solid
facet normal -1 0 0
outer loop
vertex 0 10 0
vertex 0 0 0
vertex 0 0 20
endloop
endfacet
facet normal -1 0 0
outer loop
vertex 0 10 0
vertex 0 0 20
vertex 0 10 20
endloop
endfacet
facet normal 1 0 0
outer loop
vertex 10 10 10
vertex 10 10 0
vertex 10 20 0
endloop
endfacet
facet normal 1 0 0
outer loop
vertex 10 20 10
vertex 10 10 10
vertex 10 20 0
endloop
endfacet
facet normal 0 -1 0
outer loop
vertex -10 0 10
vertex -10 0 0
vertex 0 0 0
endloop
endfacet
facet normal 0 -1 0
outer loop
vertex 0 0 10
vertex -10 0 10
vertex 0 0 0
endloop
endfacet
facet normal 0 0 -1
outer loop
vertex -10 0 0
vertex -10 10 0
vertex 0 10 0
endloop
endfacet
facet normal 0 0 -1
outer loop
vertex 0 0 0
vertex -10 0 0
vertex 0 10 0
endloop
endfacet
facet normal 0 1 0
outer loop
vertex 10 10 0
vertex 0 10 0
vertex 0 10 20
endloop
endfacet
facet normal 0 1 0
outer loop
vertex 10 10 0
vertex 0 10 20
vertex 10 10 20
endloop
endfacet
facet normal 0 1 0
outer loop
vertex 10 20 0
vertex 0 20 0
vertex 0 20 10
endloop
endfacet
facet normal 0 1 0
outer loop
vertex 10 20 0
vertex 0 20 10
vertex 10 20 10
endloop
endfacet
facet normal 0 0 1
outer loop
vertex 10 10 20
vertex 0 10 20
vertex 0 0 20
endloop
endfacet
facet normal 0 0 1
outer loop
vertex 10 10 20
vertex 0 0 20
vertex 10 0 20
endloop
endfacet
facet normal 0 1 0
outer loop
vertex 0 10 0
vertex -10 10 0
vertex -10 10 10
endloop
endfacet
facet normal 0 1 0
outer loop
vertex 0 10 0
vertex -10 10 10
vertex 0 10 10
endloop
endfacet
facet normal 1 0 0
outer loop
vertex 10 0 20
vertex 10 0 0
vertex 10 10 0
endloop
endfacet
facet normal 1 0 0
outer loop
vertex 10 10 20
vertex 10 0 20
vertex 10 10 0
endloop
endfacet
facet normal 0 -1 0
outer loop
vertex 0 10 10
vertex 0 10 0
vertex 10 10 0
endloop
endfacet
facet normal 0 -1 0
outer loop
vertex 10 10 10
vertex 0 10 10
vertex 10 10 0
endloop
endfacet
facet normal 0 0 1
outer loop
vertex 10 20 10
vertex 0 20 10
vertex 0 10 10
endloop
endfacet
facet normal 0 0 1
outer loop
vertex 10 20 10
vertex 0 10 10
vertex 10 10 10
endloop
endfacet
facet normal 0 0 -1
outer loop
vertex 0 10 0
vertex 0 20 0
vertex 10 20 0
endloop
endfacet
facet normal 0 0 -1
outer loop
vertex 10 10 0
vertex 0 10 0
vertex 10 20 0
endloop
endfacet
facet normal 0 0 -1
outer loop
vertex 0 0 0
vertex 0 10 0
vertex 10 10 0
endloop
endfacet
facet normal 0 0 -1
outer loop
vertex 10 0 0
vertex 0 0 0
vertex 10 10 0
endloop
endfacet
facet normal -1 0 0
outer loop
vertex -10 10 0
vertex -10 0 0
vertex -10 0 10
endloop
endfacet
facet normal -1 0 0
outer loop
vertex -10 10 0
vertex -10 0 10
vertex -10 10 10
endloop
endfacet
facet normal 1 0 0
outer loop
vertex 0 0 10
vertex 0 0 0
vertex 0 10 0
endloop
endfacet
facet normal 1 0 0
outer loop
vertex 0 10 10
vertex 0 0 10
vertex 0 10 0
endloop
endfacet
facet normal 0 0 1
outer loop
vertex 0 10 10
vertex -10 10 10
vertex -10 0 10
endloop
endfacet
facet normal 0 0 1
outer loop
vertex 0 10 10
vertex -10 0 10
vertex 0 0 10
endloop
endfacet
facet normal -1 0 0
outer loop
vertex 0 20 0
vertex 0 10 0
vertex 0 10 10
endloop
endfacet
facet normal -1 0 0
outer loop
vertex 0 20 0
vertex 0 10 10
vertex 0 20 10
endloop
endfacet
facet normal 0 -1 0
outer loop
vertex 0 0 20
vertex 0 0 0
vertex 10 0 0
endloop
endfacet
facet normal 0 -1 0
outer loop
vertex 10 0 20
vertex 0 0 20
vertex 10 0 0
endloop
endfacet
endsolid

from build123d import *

# Parameters (mm, degrees)
BOX_W        = 10
BOX_H        = 10
BOX_DEPTH    = 10
BOX001_W     = 10
BOX001_H     = 10
BOX001_DEPTH = 10
BOX002_W     = 10
BOX002_H     = 10
BOX002_DEPTH = 20


with BuildPart() as cub:
    # Box → Box (new body)
    with BuildSketch(Plane(origin=(-10, 0, 0), x_dir=(1, 0, 0), z_dir=(0, 0, 1))):
        with Locations((5, 5)):
            Rectangle(BOX_W, BOX_H)
    extrude(amount=BOX_DEPTH)


with BuildPart() as cub001:
    # Box001 → Box001 (new body)
    with BuildSketch(Plane(origin=(0, 10, 0), x_dir=(1, 0, 0), z_dir=(0, 0, 1))):
        with Locations((5, 5)):
            Rectangle(BOX001_W, BOX001_H)
    extrude(amount=BOX001_DEPTH)


with BuildPart() as cub002:
    # Box002 → Box002 (new body)
    with BuildSketch(Plane.XY):
        with Locations((5, 5)):
            Rectangle(BOX002_W, BOX002_H)
    extrude(amount=BOX002_DEPTH)


solid = Compound([cub.part, cub001.part, cub002.part])
